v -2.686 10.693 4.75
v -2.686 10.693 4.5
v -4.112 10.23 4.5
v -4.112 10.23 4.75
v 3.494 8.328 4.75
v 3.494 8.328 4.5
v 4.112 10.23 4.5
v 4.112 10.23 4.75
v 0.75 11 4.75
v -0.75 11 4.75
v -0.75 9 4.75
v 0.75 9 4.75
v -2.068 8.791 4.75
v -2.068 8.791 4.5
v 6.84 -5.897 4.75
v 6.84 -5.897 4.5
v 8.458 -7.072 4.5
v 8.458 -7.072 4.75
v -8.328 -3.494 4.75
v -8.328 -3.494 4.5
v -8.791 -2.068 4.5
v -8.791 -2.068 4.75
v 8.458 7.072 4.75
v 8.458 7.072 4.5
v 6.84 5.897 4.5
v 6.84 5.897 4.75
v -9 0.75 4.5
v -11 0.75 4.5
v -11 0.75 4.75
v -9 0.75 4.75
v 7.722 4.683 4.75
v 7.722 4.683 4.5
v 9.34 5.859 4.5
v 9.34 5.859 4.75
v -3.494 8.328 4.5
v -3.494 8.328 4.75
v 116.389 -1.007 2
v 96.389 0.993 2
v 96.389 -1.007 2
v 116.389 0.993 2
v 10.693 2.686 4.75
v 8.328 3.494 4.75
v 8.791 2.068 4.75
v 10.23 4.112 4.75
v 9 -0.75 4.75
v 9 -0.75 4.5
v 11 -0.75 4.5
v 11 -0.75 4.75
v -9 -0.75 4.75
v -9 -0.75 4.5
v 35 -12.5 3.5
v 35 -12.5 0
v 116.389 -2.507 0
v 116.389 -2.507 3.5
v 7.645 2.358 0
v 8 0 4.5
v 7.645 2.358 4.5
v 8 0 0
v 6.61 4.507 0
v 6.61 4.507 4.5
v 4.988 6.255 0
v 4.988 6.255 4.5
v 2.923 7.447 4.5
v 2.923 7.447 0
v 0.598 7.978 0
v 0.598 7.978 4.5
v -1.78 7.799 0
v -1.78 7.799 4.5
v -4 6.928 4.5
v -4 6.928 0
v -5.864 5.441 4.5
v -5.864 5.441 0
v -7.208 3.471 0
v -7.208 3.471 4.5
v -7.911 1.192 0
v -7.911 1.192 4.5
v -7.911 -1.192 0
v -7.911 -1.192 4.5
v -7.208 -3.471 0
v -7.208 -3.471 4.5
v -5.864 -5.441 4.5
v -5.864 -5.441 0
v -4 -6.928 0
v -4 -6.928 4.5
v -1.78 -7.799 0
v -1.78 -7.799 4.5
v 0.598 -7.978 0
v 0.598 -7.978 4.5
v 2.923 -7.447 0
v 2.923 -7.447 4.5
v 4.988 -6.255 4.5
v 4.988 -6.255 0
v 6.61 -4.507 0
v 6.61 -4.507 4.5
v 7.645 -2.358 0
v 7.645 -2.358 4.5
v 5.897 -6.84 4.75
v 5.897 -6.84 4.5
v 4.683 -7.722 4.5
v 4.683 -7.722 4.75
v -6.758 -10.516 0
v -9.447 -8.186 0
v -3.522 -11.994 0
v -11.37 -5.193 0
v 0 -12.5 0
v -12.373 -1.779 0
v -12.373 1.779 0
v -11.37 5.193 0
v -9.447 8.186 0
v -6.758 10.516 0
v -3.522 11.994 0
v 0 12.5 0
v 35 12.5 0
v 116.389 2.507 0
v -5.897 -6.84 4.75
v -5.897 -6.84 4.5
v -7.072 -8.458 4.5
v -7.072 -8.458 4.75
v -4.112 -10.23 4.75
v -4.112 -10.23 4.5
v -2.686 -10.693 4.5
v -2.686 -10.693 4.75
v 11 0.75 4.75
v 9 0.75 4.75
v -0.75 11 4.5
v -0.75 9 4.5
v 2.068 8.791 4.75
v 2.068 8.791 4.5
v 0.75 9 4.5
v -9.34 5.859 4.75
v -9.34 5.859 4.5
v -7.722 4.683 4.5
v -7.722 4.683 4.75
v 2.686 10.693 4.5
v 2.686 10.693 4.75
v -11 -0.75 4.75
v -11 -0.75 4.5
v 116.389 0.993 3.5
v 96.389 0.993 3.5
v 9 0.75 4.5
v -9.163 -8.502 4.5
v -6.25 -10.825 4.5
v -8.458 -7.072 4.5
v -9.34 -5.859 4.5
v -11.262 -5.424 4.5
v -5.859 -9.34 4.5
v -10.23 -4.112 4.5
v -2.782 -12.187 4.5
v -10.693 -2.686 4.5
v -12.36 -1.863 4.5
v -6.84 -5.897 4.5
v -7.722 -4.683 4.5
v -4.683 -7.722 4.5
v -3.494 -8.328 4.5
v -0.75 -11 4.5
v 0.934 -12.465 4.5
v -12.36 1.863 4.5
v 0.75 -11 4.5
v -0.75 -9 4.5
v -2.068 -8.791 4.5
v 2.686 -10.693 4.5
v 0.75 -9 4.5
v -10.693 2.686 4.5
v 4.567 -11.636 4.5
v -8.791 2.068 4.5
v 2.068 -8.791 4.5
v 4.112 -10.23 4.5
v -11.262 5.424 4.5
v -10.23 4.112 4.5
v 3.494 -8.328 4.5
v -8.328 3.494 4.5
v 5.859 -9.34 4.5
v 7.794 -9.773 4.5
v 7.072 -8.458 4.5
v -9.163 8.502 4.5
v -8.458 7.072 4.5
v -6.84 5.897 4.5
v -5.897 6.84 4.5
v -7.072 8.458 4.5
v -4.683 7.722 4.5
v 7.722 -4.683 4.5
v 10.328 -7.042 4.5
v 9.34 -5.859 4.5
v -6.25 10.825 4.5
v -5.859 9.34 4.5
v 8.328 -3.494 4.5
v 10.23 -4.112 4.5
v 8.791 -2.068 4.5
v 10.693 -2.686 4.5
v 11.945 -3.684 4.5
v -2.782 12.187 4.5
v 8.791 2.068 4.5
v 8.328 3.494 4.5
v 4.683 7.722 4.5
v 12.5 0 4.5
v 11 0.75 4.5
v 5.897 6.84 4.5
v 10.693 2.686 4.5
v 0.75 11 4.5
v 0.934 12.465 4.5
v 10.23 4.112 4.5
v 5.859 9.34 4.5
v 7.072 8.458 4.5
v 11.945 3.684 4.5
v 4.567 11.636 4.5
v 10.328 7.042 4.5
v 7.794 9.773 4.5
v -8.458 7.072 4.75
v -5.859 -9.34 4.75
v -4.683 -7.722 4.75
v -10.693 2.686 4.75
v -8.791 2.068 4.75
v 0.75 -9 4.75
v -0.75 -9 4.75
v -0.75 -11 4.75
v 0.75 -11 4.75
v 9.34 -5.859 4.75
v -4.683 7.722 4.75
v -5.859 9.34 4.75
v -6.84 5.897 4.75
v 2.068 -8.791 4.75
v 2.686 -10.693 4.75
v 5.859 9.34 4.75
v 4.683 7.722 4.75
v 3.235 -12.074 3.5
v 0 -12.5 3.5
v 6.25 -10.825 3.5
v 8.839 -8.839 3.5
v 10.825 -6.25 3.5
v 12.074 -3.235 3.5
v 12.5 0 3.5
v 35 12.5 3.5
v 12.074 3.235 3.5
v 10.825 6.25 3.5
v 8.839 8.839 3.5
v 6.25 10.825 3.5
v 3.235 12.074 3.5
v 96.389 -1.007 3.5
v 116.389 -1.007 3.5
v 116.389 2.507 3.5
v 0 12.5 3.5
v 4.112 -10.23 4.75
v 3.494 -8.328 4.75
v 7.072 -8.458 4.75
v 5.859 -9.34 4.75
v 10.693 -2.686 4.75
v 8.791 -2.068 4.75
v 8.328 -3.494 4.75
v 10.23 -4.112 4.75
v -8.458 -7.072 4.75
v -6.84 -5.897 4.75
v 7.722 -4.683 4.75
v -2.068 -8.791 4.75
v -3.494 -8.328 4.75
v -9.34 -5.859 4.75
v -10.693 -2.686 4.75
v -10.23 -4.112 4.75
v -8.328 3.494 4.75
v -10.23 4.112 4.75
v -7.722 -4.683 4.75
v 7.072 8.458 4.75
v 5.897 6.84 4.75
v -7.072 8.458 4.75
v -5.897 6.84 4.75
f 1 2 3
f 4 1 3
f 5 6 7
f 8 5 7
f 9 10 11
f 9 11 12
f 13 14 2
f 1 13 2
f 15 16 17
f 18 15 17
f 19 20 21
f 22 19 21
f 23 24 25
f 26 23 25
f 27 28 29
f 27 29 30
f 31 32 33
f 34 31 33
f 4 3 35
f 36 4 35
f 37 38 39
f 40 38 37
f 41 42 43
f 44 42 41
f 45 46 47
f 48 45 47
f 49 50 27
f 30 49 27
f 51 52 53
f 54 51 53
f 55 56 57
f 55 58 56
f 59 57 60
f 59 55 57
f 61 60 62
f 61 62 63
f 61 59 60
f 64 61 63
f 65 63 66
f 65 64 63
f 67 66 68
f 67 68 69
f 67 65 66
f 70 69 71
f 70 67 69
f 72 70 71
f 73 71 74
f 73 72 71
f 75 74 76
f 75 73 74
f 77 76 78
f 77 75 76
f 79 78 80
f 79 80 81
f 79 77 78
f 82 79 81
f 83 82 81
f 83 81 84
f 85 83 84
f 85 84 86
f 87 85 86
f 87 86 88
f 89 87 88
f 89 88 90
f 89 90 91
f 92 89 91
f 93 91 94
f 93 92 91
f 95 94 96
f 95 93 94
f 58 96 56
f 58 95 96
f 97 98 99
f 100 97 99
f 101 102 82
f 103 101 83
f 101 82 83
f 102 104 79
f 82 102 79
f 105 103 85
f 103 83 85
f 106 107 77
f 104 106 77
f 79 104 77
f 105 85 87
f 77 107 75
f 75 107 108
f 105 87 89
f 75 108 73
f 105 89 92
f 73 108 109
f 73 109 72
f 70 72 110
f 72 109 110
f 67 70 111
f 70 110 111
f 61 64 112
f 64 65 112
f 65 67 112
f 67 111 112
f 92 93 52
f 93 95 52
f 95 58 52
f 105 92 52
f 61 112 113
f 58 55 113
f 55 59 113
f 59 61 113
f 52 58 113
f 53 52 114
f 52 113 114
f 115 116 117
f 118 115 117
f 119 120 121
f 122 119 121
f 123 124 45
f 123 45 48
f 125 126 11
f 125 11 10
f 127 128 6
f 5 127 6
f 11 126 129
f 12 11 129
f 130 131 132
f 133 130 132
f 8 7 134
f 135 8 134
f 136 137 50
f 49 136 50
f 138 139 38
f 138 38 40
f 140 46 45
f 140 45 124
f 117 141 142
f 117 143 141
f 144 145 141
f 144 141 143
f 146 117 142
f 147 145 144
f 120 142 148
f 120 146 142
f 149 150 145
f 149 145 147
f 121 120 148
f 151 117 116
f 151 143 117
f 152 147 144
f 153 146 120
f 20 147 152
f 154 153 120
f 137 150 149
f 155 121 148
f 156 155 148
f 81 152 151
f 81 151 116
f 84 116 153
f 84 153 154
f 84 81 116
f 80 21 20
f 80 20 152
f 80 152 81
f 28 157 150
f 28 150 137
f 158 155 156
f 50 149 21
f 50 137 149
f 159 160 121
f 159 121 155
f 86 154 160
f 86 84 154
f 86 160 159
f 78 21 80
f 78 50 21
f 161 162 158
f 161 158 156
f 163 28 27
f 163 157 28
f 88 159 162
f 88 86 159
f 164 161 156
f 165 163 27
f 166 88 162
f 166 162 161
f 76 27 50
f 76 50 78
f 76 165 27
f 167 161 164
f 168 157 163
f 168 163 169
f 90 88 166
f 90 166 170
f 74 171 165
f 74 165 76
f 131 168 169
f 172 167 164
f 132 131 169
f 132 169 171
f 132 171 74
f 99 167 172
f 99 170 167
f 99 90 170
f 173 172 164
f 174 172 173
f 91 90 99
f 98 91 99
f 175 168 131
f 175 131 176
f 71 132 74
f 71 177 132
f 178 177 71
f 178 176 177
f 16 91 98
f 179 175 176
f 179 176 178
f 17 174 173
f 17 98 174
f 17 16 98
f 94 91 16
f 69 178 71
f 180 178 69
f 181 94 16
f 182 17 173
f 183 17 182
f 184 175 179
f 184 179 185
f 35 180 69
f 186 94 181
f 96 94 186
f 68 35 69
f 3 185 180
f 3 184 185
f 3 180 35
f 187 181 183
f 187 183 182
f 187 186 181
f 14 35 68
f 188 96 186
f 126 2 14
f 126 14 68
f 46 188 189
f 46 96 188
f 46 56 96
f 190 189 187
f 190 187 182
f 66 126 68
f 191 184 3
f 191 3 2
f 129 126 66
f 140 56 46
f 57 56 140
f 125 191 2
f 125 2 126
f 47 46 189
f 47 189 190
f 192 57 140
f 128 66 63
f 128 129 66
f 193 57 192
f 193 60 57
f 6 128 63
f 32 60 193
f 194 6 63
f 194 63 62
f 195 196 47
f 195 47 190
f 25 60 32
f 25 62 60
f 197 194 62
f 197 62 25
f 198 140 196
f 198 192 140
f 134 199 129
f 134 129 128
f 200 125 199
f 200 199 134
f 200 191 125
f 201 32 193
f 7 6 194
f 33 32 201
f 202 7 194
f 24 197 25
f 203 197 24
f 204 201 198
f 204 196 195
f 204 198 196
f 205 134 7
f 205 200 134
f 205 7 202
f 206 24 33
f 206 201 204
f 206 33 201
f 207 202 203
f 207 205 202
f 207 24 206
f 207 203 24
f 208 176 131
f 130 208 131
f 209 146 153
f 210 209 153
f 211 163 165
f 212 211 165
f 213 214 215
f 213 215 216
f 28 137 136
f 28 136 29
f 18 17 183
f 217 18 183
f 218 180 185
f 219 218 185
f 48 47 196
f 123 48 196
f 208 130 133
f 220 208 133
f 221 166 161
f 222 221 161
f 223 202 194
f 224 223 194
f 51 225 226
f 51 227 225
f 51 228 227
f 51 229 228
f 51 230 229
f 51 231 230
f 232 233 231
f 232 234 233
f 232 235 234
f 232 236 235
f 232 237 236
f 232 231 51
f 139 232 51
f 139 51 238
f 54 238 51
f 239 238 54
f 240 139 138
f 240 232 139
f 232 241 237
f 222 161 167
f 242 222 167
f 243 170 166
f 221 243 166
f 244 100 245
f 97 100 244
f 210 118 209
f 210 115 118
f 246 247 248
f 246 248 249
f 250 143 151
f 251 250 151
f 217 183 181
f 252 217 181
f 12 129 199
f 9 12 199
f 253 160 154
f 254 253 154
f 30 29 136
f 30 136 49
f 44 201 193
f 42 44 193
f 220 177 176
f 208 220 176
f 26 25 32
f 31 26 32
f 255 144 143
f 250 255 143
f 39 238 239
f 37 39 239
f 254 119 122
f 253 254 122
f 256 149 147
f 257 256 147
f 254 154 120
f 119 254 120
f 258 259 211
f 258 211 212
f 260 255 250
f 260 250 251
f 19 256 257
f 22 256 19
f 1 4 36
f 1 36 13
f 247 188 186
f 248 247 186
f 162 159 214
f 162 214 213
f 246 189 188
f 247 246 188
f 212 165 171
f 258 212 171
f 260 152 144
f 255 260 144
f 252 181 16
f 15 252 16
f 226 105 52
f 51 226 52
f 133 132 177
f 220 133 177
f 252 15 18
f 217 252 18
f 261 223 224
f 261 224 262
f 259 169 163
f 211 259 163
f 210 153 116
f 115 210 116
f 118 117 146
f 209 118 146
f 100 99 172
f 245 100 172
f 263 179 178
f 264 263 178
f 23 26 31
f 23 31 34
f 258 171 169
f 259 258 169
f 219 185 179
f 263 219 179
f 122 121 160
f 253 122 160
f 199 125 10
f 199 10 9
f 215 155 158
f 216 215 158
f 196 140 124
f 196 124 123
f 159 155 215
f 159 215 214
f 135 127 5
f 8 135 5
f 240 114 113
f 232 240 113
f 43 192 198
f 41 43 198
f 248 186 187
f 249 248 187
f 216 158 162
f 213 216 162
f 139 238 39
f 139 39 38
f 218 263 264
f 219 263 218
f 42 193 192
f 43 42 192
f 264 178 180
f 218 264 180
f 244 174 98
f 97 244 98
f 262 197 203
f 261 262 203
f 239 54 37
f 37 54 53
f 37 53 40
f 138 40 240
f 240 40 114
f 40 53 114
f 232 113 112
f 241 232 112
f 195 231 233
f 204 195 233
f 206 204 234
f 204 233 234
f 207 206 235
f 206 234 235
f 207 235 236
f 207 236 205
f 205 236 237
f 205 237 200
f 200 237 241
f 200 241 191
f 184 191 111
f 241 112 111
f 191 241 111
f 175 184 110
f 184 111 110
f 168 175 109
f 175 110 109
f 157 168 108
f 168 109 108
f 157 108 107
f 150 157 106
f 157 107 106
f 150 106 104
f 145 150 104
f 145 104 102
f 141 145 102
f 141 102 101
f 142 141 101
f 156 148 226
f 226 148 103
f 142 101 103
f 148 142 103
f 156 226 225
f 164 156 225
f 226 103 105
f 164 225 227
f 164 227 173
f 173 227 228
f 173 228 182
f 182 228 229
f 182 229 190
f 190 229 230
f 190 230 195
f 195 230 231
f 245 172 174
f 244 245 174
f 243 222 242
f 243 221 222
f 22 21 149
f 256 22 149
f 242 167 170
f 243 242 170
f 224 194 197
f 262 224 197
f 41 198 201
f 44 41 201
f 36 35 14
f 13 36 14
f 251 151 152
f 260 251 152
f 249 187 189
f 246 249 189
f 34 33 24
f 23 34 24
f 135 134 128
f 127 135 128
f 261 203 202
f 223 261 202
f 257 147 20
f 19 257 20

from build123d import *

# Parameters (mm, degrees)
F0_R     = 8
F1_DEPTH = 3.5
F2_R     = 12.5
F2_R_2   = 8
F3_DEPTH = 1
F4_W     = 1.5
F4_H     = 2
F4_W_2   = 2
F4_H_2   = 1.5
F5_DEPTH = 0.25
F6_W     = 20
F6_H     = 2
F7_DEPTH = 1.5


with BuildPart() as f1:
    # F0 (on Top) → F1 (new body)
    with BuildSketch(Plane.XY):
        with BuildLine():
            ThreePointArc((0, -12.5), (8.838835, -8.838835), (12.5, 0))
            ThreePointArc((12.5, 0), (8.838835, 8.838835), (0, 12.5))
            ThreePointArc((0, 12.5), (-12.5, 0), (0, -12.5))
        make_face()
        Circle(F0_R, mode=Mode.SUBTRACT)
        with BuildLine():
            ThreePointArc((0, 12.5), (8.838835, 8.838835), (12.5, 0))
            ThreePointArc((12.5, 0), (8.838835, -8.838835), (0, -12.5))
            Line((0, -12.5), (35, -12.5))
            Line((35, -12.5), (116.388784, -2.506714))
            Line((116.388784, -2.506714), (116.388784, 2.506714))
            Line((116.388784, 2.506714), (35, 12.5))
            Line((35, 12.5), (0, 12.5))
        make_face()
    extrude(amount=F1_DEPTH)

    # F2 (on face) → F3 (join)
    with BuildSketch(Plane.XY.offset(3.5)):
        Circle(F2_R)
        Circle(F2_R_2, mode=Mode.SUBTRACT)
    extrude(amount=F3_DEPTH)

    # F4 (on face) → F5 (join)
    with BuildSketch(Plane.XY.offset(4.5)):
        with Locations((0, 10)):
            Rectangle(F4_W, F4_H)
        Polygon((-2.685895, 10.693384), (-4.112479, 10.229859), (-3.494445, 8.327746), (-2.067861, 8.791271), align=None)
        Polygon((-5.858875, 9.340026), (-7.072401, 8.458348), (-5.89683, 6.840314), (-4.683305, 7.721992), align=None)
        Polygon((-8.458348, 7.072401), (-9.340026, 5.858875), (-7.721992, 4.683305), (-6.840314, 5.89683), align=None)
        Polygon((-10.229859, 4.112479), (-10.693384, 2.685895), (-8.791271, 2.067861), (-8.327746, 3.494445), align=None)
        with Locations((-10, 0)):
            Rectangle(F4_W_2, F4_H_2)
        Polygon((-10.693384, -2.685895), (-10.229859, -4.112479), (-8.327746, -3.494445), (-8.791271, -2.067861), align=None)
        Polygon((-9.340026, -5.858875), (-8.458348, -7.072401), (-6.840314, -5.89683), (-7.721992, -4.683305), align=None)
        Polygon((-7.072401, -8.458348), (-5.858875, -9.340026), (-4.683305, -7.721992), (-5.89683, -6.840314), align=None)
        Polygon((-4.112479, -10.229859), (-2.685895, -10.693384), (-2.067861, -8.791271), (-3.494445, -8.327746), align=None)
        with Locations((0, -10)):
            Rectangle(F4_W, F4_H)
        Polygon((2.685895, -10.693384), (4.112479, -10.229859), (3.494445, -8.327746), (2.067861, -8.791271), align=None)
        Polygon((5.858875, -9.340026), (7.072401, -8.458348), (5.89683, -6.840314), (4.683305, -7.721992), align=None)
        Polygon((8.458348, -7.072401), (9.340026, -5.858875), (7.721992, -4.683305), (6.840314, -5.89683), align=None)
        Polygon((10.229859, -4.112479), (10.693384, -2.685895), (8.791271, -2.067861), (8.327746, -3.494445), align=None)
        with Locations((10, 0)):
            Rectangle(F4_W_2, F4_H_2)
        Polygon((10.693384, 2.685895), (10.229859, 4.112479), (8.327746, 3.494445), (8.791271, 2.067861), align=None)
        Polygon((9.340026, 5.858875), (8.458348, 7.072401), (6.840314, 5.89683), (7.721992, 4.683305), align=None)
        Polygon((7.072401, 8.458348), (5.858875, 9.340026), (4.683305, 7.721992), (5.89683, 6.840314), align=None)
        Polygon((4.112479, 10.229859), (2.685895, 10.693384), (2.067861, 8.791271), (3.494445, 8.327746), align=None)
    extrude(amount=F5_DEPTH)

    # F6 (on face) → F7 (cut)
    with BuildSketch(Plane.XY.offset(3.5)):
        with Locations((106.388784, -0.006714)):
            Rectangle(F6_W, F6_H)
    extrude(amount=-F7_DEPTH, mode=Mode.SUBTRACT)


solid = f1.part
